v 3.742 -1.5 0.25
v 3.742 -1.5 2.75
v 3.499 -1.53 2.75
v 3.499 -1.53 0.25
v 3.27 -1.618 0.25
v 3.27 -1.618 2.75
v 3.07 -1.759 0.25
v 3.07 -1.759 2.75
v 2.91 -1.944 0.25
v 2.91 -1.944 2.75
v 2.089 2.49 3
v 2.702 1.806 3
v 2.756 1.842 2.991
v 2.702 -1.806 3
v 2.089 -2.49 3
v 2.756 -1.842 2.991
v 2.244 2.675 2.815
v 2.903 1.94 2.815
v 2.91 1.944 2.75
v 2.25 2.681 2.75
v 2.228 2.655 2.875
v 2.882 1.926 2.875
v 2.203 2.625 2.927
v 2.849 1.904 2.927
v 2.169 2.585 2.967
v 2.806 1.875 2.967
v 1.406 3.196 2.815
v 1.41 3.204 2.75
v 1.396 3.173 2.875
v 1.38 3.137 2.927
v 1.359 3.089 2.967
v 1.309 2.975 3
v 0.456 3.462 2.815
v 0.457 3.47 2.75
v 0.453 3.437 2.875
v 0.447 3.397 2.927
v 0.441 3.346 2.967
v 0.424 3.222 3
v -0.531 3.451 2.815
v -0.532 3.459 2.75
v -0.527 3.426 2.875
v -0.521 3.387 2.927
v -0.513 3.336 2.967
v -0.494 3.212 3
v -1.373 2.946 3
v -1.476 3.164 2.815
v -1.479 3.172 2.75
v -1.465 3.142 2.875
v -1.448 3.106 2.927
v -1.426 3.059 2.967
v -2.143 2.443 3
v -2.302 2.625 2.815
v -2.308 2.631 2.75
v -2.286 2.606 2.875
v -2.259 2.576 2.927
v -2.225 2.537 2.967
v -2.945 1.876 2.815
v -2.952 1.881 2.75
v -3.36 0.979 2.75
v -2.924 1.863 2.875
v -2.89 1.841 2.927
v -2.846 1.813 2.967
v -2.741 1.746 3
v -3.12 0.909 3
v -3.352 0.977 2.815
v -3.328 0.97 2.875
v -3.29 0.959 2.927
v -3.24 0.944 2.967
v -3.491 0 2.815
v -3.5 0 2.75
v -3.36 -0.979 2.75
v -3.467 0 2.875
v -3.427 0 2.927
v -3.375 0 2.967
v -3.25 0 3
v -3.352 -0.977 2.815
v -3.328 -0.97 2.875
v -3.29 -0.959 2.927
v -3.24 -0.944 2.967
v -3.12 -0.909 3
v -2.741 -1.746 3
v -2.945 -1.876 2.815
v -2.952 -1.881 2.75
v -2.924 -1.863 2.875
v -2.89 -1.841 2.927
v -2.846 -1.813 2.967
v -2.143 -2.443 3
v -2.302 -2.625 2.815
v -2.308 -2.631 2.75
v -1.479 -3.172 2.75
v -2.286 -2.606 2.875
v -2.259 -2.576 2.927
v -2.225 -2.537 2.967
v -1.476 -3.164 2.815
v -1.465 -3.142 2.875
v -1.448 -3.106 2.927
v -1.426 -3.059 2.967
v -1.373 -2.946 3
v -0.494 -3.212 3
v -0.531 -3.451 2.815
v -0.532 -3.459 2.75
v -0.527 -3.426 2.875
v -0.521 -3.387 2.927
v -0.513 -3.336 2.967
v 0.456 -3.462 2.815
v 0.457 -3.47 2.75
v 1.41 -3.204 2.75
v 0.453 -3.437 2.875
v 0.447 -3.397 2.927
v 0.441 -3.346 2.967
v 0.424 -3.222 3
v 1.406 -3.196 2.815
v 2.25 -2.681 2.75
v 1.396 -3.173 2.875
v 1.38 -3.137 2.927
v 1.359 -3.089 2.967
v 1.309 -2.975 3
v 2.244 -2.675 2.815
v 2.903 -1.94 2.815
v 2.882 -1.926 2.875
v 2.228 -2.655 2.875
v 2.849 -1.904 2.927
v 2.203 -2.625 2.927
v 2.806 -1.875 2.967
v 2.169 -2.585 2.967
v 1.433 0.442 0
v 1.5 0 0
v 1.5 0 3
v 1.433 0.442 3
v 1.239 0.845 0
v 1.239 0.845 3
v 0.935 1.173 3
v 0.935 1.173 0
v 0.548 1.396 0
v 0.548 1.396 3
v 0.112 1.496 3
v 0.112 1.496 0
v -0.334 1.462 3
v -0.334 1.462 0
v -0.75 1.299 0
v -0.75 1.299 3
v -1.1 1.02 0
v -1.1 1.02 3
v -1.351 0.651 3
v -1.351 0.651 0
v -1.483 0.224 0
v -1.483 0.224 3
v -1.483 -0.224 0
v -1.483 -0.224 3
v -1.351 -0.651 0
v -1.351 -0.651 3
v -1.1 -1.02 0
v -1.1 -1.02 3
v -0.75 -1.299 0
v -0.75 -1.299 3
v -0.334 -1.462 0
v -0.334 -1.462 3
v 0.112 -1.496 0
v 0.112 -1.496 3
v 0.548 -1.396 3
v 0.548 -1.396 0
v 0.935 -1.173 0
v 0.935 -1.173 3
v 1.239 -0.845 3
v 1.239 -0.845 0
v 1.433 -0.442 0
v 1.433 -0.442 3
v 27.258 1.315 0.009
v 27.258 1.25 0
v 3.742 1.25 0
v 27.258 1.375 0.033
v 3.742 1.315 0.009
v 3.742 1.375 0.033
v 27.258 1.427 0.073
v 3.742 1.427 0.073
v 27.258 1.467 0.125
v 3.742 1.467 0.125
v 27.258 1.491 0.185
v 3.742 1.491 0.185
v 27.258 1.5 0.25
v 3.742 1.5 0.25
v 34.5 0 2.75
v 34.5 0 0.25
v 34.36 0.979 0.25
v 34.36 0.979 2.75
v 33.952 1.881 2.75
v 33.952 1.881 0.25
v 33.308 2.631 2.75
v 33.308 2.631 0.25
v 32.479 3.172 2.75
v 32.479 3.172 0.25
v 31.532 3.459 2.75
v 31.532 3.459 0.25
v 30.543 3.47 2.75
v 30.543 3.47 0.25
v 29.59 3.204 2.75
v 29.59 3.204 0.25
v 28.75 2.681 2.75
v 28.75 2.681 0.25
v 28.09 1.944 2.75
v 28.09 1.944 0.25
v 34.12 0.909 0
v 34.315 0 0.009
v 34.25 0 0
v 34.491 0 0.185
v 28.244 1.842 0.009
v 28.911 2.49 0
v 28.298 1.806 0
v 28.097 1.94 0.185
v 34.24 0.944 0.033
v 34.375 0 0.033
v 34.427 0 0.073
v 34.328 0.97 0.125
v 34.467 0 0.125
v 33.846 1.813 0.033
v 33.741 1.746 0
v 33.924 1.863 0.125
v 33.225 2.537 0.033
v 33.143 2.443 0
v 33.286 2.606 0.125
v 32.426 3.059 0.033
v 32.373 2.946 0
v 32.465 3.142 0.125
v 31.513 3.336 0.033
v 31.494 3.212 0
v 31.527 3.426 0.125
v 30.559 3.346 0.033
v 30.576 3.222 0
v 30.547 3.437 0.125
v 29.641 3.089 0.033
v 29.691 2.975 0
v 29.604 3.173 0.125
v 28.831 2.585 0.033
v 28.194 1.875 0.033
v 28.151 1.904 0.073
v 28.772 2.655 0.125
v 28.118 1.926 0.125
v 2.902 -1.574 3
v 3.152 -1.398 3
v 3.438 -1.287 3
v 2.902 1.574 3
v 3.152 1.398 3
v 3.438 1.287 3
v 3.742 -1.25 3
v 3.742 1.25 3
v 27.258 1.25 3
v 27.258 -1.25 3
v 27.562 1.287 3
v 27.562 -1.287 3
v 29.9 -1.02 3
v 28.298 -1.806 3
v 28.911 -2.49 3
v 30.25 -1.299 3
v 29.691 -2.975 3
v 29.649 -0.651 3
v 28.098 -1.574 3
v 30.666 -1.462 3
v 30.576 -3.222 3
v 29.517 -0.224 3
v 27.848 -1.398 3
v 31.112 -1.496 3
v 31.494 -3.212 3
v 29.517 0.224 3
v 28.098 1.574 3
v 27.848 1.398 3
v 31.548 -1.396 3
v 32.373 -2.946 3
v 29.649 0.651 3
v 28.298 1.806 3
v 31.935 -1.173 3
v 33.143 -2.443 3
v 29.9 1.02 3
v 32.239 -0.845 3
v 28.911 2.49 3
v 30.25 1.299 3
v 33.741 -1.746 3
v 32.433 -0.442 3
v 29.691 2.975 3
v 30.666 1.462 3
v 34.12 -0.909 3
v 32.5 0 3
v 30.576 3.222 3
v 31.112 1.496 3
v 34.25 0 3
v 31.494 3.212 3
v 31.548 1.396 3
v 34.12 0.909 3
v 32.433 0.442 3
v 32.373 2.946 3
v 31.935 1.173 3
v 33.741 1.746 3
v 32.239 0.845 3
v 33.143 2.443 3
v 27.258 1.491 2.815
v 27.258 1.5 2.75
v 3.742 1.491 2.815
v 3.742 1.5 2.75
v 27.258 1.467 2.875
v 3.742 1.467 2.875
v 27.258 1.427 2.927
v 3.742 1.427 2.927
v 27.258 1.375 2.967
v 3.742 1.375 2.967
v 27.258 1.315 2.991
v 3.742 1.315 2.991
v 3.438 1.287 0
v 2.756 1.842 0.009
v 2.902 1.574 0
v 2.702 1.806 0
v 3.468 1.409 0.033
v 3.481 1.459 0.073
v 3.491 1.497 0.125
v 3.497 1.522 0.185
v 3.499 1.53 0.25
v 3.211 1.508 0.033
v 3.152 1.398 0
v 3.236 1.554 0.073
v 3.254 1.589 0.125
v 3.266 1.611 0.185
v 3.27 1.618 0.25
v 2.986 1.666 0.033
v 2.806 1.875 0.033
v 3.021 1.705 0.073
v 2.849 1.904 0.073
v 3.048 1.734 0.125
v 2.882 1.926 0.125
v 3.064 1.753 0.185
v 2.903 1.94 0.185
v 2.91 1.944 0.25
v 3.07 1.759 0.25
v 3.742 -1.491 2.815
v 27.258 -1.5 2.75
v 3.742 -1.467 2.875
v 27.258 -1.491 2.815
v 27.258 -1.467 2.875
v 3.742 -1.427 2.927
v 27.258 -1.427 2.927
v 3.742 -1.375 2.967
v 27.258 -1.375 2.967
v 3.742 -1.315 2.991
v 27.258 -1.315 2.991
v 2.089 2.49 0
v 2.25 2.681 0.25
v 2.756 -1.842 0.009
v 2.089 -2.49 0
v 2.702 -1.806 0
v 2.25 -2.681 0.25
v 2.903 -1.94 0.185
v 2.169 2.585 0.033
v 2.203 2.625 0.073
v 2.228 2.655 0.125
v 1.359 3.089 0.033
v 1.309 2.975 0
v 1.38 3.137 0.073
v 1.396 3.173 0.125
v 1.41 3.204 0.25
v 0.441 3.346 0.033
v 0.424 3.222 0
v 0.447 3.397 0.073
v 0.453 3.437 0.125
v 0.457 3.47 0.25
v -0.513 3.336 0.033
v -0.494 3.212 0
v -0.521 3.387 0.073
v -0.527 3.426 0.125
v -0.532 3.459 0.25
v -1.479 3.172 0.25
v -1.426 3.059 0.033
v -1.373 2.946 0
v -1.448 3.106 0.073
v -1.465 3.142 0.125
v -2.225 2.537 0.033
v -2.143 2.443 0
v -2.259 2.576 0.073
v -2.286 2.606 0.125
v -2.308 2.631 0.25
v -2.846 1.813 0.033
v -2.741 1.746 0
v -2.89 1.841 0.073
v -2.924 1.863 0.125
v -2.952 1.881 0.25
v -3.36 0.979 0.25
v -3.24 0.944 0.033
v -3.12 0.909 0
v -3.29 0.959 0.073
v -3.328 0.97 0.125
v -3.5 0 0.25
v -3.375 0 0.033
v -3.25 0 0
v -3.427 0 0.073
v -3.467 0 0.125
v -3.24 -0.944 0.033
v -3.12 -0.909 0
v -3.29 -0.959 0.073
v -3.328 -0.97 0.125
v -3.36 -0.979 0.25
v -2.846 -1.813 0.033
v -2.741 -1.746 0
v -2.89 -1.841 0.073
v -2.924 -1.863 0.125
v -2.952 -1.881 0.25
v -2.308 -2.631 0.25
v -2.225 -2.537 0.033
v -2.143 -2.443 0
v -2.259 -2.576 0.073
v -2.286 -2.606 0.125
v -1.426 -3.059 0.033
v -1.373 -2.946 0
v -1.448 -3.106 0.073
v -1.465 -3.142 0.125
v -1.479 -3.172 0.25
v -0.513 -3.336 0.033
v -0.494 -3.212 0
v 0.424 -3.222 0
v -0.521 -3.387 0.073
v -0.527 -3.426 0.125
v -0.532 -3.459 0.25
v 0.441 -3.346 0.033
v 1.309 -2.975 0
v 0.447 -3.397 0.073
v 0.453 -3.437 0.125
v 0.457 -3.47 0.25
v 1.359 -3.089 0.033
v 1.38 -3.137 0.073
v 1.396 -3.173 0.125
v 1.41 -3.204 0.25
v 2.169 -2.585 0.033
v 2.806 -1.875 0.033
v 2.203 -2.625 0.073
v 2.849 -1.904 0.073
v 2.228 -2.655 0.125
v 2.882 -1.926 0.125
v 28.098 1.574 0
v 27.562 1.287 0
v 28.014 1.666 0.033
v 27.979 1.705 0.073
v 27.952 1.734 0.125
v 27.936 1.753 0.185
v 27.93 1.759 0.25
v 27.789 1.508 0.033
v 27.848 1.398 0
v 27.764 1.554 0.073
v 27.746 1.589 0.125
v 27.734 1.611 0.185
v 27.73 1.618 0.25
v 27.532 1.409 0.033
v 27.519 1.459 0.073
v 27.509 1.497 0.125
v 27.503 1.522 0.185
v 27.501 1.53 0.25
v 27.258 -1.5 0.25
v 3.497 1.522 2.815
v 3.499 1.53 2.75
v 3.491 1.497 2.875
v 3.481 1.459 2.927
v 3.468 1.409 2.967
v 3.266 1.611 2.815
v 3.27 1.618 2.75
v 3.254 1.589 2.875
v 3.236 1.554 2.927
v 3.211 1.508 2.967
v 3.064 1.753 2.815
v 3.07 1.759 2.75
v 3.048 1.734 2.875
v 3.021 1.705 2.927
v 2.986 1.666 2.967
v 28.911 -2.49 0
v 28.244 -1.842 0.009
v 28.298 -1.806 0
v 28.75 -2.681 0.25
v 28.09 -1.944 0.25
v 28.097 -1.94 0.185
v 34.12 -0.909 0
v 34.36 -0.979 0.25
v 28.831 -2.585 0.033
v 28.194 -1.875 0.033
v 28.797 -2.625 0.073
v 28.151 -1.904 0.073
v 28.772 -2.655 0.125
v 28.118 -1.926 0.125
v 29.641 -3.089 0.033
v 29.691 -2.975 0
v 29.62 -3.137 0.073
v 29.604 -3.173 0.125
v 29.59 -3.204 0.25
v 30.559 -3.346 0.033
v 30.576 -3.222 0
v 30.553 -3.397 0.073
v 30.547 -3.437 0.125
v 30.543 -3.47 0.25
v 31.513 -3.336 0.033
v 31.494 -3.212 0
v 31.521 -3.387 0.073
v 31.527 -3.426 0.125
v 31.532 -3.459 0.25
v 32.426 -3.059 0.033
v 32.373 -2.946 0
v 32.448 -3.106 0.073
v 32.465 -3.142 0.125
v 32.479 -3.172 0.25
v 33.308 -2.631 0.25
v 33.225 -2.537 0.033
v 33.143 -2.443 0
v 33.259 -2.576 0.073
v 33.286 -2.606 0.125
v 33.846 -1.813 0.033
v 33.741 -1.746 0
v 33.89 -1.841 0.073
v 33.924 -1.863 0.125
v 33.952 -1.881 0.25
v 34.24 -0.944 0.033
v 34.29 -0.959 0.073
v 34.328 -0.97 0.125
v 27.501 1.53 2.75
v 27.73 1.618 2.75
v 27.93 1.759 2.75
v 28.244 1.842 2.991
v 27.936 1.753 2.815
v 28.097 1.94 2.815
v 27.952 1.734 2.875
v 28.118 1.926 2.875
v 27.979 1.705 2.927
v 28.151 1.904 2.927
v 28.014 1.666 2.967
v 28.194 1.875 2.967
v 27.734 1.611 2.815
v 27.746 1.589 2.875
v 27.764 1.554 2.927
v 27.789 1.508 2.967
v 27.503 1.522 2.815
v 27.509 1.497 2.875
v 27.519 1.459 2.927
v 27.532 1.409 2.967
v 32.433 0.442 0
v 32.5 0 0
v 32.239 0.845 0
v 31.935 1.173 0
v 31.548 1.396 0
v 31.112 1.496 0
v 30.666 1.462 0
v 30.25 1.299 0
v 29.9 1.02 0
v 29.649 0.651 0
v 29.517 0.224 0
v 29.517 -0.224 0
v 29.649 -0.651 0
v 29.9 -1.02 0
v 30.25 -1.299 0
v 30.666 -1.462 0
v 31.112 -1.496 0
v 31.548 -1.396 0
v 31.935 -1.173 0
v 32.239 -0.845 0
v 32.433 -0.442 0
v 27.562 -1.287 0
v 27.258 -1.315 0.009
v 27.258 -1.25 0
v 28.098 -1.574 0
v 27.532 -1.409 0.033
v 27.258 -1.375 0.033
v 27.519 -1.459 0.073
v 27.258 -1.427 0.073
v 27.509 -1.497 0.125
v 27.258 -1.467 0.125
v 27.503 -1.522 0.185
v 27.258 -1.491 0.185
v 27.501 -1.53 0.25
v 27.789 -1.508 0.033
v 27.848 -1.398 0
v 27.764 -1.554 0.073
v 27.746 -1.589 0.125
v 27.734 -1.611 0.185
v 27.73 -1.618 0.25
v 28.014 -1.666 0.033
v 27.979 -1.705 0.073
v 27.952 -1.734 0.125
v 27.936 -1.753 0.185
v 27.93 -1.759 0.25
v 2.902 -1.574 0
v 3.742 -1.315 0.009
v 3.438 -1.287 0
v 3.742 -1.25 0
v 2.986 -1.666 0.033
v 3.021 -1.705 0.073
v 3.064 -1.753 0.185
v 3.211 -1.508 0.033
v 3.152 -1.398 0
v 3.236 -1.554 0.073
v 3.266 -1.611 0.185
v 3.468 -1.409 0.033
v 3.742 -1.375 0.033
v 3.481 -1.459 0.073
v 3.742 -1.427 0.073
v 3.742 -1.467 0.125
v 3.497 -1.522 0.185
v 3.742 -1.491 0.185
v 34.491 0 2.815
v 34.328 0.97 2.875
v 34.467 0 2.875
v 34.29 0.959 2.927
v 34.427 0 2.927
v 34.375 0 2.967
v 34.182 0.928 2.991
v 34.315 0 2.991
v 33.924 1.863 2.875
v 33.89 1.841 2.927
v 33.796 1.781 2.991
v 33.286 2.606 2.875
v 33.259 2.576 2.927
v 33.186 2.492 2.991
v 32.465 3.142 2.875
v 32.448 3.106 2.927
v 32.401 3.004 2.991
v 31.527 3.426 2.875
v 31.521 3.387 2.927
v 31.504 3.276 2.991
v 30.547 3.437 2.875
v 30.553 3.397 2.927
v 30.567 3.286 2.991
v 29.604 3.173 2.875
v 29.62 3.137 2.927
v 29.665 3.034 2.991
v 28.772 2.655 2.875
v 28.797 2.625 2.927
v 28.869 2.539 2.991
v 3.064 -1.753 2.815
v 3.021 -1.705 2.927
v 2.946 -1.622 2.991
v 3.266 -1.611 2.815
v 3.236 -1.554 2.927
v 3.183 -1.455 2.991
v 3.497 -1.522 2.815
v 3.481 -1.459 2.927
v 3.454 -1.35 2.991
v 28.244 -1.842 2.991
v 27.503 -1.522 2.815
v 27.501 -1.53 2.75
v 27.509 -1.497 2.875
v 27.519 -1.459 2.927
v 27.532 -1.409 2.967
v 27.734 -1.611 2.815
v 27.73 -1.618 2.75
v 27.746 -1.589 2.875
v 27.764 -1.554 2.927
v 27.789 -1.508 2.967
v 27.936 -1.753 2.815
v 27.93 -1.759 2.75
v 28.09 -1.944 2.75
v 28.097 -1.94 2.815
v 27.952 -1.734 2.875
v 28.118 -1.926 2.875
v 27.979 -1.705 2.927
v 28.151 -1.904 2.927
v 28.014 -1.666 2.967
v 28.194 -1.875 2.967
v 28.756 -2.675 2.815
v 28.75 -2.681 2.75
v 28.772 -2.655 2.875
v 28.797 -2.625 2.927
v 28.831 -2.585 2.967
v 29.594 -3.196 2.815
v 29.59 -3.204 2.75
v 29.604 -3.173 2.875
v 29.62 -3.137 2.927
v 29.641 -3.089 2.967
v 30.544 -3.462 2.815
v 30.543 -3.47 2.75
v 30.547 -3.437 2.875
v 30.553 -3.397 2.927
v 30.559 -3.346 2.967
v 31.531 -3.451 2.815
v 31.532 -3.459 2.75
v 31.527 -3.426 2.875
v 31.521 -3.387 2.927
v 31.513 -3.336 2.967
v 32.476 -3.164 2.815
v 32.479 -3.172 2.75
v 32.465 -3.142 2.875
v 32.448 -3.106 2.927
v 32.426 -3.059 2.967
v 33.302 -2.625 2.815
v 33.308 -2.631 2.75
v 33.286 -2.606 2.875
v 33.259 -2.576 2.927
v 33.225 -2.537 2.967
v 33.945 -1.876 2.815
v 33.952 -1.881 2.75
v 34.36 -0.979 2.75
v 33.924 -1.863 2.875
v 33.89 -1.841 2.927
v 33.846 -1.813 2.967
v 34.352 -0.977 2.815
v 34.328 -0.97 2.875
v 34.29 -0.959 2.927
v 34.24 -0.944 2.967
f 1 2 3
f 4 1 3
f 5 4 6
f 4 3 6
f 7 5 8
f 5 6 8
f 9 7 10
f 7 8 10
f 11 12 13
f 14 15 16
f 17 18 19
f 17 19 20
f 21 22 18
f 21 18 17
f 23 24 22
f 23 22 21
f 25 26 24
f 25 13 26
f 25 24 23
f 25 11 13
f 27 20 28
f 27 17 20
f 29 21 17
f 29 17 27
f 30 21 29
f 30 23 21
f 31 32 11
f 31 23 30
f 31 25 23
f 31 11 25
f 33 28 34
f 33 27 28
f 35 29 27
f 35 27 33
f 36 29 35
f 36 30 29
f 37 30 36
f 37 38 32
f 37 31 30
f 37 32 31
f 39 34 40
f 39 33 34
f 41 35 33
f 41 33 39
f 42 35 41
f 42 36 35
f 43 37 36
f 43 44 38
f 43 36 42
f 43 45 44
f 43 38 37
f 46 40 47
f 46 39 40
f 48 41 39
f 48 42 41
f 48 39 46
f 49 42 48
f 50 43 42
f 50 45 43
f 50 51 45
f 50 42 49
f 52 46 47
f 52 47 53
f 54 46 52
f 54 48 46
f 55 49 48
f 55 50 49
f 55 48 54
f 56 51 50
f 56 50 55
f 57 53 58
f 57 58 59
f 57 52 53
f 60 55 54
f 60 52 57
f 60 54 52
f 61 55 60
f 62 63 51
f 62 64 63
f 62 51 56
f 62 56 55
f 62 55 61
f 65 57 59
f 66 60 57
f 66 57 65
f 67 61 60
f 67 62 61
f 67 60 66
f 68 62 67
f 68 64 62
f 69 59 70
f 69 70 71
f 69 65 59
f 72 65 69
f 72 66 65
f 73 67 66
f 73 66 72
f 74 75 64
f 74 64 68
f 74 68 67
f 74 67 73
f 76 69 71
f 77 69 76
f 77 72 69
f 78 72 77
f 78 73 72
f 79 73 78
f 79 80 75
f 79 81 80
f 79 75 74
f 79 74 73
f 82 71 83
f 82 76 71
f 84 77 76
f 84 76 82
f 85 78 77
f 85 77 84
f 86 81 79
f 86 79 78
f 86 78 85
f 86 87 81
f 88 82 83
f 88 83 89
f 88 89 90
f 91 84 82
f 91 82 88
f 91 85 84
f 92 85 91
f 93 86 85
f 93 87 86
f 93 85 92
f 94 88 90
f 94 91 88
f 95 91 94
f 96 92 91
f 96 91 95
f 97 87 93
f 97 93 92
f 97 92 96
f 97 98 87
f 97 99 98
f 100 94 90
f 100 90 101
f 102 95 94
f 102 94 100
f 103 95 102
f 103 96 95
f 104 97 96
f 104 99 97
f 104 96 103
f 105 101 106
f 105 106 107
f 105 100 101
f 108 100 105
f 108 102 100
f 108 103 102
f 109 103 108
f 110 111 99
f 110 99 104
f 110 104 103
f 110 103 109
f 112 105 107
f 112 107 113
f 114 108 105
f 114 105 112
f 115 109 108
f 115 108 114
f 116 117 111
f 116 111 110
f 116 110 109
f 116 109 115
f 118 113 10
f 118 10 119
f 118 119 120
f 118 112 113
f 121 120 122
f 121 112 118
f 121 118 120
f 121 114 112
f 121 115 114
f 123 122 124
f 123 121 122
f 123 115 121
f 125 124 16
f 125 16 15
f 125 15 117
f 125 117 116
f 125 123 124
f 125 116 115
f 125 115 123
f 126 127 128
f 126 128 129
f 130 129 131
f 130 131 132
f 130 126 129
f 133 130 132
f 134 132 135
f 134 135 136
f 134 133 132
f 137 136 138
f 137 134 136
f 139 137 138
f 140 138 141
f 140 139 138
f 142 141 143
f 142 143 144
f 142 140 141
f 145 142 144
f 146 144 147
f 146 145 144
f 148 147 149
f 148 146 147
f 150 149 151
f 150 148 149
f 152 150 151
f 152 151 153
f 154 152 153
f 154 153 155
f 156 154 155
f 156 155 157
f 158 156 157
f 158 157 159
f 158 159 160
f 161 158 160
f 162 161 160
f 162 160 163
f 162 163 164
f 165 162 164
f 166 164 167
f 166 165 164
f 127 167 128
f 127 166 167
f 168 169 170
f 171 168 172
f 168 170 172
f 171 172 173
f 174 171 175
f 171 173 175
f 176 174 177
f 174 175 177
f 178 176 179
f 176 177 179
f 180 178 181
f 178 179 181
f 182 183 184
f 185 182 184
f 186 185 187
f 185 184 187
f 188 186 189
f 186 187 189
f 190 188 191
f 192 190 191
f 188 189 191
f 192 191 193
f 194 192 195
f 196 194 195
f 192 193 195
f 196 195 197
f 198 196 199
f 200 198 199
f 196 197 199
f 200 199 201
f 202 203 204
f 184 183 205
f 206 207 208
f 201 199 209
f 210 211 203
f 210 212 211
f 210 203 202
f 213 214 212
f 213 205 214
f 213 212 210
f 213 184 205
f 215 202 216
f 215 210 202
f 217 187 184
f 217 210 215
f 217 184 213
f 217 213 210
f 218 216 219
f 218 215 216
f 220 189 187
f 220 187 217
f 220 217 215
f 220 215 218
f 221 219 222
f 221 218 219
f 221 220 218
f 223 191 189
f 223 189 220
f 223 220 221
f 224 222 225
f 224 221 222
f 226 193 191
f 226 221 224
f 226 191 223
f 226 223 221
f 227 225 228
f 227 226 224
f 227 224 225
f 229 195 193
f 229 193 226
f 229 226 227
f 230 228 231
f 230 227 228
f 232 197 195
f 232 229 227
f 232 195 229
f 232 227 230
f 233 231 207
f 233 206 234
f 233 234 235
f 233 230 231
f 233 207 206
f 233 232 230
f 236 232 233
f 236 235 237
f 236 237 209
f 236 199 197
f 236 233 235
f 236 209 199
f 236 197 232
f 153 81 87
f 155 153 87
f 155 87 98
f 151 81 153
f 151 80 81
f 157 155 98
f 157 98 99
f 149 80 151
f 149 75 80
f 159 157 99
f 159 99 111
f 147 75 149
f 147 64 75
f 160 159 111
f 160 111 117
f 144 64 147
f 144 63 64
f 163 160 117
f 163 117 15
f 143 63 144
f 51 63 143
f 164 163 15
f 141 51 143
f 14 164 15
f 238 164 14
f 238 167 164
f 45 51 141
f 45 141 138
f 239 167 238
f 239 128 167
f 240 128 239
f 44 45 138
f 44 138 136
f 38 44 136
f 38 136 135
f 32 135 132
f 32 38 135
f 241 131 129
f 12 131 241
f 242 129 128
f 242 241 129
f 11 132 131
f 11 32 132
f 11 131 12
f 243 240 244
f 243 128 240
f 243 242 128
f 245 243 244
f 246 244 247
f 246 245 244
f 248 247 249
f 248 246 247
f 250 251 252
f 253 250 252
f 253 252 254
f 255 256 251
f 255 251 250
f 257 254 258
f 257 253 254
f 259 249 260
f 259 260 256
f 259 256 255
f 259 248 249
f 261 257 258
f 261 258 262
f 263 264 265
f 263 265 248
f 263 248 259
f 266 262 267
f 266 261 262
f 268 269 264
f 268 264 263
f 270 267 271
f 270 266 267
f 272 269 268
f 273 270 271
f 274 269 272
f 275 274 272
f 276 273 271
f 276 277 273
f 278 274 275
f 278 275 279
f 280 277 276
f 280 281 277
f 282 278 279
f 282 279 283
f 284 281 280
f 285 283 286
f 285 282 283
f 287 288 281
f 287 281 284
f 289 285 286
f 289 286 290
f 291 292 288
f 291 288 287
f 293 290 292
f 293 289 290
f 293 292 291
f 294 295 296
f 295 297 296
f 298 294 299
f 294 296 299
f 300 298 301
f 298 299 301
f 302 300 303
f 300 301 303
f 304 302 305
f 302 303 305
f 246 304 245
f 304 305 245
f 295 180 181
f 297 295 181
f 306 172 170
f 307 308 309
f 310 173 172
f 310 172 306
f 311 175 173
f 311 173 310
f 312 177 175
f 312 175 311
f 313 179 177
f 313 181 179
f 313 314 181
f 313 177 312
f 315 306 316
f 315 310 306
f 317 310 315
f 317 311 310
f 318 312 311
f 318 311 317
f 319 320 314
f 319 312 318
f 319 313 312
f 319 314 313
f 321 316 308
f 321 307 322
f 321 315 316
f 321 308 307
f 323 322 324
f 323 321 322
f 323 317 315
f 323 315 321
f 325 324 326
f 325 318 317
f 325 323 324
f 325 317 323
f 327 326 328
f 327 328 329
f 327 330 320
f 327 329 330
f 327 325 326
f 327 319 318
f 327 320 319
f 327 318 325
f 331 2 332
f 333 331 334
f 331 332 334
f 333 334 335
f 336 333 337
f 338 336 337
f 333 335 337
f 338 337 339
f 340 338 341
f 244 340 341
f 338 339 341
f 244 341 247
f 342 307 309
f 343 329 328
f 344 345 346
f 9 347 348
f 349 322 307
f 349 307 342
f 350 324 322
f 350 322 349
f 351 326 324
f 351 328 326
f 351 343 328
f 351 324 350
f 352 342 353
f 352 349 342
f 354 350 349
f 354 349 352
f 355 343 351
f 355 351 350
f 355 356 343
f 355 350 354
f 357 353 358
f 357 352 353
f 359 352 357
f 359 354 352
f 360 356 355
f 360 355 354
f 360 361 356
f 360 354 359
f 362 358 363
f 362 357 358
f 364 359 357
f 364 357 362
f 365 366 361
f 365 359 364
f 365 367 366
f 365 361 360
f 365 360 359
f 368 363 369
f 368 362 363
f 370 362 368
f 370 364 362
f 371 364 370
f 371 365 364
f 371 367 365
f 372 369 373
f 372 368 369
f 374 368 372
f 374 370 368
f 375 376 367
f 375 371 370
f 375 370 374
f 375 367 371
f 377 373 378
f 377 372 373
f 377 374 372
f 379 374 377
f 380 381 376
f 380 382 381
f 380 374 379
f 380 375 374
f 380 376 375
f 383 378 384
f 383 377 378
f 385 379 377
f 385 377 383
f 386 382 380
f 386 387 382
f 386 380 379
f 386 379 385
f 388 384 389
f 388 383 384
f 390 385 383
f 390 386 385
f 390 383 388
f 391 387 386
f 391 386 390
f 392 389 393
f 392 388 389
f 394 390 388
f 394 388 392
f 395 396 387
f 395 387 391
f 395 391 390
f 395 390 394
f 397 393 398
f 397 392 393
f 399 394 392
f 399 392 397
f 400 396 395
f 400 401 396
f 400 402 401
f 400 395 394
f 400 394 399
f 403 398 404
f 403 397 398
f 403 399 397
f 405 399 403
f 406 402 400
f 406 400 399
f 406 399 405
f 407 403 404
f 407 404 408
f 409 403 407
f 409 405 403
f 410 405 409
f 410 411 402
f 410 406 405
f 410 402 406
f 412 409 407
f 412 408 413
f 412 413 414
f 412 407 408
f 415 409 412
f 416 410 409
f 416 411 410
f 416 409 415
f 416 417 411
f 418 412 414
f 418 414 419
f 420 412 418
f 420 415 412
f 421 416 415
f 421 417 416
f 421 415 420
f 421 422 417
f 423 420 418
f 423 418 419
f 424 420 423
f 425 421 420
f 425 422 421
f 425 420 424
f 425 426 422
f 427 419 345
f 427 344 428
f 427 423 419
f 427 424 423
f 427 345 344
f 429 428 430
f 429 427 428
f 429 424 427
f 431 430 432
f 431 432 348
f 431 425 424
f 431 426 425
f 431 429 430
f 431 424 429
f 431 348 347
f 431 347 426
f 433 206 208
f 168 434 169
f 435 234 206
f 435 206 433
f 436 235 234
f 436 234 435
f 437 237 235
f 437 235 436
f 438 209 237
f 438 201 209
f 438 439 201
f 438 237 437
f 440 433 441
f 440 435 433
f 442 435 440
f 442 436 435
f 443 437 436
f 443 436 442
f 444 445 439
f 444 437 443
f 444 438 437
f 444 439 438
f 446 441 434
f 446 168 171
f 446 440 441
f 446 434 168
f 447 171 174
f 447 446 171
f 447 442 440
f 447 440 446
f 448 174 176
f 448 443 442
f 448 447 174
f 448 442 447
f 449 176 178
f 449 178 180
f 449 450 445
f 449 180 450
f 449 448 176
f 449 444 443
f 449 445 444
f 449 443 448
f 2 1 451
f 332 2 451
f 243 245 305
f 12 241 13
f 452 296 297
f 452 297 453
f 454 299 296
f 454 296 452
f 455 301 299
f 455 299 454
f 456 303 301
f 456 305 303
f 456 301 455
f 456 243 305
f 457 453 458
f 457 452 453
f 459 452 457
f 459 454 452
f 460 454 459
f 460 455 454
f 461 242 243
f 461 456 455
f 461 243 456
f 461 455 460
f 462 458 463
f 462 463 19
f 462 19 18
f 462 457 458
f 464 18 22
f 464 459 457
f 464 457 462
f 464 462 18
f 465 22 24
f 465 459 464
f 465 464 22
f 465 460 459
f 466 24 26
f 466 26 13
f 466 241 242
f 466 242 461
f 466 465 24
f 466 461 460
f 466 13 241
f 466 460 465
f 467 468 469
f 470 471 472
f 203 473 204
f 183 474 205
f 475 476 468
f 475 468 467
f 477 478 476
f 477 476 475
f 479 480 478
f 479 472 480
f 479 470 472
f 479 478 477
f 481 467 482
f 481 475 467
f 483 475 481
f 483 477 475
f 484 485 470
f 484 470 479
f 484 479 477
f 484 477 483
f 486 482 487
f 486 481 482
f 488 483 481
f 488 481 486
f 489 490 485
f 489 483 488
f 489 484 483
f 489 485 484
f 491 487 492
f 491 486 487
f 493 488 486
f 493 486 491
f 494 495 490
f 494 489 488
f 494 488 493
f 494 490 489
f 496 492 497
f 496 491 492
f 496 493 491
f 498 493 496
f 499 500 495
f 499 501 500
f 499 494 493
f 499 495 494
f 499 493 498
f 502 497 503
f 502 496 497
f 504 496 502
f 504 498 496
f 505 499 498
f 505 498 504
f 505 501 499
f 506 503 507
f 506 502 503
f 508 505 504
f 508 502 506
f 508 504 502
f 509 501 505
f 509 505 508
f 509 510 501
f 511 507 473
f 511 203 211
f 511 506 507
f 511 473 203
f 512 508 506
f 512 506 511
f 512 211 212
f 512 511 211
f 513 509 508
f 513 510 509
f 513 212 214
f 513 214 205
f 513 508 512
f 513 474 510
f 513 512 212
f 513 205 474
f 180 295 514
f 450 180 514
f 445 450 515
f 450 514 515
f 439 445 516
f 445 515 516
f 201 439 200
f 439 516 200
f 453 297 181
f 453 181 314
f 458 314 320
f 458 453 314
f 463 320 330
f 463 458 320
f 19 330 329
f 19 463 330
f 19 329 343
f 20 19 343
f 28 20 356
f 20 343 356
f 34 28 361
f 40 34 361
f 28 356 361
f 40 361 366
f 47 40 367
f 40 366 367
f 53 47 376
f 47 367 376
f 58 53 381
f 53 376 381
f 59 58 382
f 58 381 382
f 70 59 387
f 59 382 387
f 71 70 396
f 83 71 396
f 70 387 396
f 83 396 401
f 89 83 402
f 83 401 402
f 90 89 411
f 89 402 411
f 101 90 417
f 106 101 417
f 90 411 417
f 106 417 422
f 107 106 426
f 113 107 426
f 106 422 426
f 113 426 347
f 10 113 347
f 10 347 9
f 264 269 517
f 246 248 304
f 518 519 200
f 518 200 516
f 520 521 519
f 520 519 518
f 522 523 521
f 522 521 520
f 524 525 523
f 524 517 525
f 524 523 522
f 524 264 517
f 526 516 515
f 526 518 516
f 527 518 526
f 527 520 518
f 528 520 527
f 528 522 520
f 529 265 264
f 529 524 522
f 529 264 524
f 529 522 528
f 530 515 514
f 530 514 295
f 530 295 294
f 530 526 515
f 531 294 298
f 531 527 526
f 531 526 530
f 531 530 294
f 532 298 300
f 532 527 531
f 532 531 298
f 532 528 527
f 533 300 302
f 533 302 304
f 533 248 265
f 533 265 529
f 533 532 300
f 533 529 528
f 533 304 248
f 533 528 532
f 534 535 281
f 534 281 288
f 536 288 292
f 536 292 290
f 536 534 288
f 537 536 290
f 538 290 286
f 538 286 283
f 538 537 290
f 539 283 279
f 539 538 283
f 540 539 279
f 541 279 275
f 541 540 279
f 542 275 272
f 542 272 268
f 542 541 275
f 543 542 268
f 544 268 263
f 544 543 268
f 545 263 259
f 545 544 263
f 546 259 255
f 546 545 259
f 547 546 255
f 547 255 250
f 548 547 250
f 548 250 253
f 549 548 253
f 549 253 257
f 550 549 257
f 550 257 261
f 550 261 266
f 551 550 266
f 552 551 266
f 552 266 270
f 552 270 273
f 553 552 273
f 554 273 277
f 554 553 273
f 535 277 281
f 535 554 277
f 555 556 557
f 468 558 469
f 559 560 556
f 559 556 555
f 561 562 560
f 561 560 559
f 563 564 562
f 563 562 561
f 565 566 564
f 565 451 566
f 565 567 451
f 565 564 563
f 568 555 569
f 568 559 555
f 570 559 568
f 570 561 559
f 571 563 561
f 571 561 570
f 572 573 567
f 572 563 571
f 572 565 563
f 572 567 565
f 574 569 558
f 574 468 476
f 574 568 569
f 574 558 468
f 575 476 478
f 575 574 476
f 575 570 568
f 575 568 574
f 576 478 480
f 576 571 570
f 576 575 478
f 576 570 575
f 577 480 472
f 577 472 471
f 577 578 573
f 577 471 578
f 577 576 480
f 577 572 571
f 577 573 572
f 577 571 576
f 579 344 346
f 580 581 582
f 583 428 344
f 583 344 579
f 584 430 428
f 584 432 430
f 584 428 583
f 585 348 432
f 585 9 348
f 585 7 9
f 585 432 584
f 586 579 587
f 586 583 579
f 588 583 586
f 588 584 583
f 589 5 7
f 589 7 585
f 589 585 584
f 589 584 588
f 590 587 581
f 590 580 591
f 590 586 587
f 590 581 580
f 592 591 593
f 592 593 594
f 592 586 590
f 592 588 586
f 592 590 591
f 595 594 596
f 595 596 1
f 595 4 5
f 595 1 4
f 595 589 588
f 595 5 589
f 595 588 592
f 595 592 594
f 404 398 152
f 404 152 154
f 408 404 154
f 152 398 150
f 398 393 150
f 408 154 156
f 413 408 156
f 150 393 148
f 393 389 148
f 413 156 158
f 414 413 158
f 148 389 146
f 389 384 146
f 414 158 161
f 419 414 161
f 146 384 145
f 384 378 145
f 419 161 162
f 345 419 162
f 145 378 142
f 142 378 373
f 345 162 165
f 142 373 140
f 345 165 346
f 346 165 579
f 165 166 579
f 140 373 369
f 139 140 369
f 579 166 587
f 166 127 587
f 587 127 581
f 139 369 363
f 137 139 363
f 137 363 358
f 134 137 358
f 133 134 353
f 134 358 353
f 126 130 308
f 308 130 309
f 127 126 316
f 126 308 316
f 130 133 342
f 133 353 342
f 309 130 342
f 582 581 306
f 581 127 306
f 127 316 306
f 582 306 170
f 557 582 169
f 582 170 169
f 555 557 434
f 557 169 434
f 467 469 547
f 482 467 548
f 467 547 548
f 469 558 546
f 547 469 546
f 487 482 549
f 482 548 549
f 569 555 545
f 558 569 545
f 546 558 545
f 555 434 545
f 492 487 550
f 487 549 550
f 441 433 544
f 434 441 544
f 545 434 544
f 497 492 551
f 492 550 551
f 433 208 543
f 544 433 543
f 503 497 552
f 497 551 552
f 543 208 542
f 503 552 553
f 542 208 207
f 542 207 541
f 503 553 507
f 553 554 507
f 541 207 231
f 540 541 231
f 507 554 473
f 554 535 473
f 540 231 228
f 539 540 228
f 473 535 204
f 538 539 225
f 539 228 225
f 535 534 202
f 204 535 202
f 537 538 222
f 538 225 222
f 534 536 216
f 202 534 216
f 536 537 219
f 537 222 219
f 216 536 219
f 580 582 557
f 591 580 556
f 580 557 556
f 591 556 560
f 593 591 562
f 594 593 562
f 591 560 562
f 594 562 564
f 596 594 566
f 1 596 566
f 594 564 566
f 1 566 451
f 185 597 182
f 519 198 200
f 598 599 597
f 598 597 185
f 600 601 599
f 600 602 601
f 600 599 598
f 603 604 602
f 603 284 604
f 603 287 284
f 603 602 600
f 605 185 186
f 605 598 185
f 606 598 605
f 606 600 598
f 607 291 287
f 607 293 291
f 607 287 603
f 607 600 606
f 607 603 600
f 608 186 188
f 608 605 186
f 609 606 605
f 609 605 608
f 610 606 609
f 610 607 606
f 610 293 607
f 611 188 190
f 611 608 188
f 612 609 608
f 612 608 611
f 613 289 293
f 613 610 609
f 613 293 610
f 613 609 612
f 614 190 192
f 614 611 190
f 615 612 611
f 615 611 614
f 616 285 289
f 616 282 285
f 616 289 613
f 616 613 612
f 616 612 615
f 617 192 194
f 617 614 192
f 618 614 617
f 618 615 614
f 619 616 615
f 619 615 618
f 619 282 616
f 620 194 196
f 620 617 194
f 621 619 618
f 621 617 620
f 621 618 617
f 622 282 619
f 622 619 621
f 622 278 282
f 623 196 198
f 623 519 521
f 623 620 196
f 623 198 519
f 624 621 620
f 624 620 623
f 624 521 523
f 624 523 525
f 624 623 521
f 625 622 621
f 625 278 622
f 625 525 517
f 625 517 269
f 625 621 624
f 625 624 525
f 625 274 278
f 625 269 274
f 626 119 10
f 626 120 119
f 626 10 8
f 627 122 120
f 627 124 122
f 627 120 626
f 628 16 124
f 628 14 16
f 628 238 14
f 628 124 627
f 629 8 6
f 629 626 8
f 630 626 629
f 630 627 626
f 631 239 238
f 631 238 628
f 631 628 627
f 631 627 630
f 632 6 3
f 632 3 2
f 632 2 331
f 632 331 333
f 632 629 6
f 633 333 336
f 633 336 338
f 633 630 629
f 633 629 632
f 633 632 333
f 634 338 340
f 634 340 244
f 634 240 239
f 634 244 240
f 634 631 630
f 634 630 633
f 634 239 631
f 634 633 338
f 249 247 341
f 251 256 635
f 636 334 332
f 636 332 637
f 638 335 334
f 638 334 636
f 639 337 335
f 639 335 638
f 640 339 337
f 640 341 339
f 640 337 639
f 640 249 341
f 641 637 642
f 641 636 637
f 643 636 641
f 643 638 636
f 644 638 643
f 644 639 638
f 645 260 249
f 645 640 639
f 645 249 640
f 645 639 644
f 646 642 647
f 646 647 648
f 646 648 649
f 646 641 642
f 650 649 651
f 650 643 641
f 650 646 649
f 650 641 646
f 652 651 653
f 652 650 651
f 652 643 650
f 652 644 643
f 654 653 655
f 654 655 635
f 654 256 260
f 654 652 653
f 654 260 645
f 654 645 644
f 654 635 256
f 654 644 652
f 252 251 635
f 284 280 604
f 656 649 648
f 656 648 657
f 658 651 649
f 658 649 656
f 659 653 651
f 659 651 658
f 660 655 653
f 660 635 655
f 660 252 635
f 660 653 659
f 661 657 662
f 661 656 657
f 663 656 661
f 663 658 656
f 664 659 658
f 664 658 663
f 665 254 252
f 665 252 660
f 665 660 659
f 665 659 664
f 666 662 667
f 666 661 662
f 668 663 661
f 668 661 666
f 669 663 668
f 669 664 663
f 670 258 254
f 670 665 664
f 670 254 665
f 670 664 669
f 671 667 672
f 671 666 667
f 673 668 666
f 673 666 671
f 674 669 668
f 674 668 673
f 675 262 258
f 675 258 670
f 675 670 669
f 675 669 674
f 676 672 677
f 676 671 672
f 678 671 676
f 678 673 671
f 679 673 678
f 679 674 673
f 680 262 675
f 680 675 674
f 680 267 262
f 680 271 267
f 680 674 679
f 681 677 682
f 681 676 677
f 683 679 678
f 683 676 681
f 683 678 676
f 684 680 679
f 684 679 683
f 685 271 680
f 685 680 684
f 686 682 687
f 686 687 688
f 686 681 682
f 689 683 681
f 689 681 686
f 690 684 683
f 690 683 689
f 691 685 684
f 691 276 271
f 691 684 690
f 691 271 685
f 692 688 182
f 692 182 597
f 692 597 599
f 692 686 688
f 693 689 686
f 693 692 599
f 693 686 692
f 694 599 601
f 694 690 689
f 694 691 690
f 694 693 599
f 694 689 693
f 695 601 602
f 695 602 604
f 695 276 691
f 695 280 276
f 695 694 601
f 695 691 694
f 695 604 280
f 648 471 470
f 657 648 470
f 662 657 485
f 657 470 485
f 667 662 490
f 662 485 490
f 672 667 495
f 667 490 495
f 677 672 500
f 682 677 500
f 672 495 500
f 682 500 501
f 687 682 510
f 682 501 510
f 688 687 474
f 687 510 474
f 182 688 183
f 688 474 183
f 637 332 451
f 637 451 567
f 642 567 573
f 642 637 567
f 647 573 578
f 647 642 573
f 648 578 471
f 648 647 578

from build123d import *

# Parameters (mm, degrees)
SKETCH3_R           = 1.5
BOSS_EXTRUDE2_DEPTH = 3
FILLET1_R           = 1
FILLET2_R           = 0.25


with BuildPart() as part:
    # Sketch3 → Boss-Extrude2 (new body)
    # profile 1 of 5: a face of its own
    with BuildSketch(Plane.XY):
        with BuildLine():
            ThreePointArc((3.16227766, 1.5), (-3.5, 0), (3.16227766, -1.5))
            Line((3.16227766, -1.5), (3.16227766, 1.5))
        make_face()
        Circle(SKETCH3_R, mode=Mode.SUBTRACT)
    # profile 2 of 5: a face of its own
    with BuildSketch(Plane.XY):
        with BuildLine():
            Line((3.16227766, 1.5), (3.16227766, -1.5))
            ThreePointArc((3.16227766, -1.5), (3.414525722, -0.768774411), (3.5, 0))
            ThreePointArc((3.5, 0), (3.414525722, 0.768774411), (3.16227766, 1.5))
        make_face()
    # profile 3 of 5: a face of its own
    with BuildSketch(Plane.XY):
        with BuildLine():
            Line((3.16227766, -1.5), (27.83772234, -1.5))
            ThreePointArc((27.83772234, -1.5), (27.5, 0), (27.83772234, 1.5))
            Line((27.83772234, 1.5), (3.16227766, 1.5))
            ThreePointArc((3.16227766, 1.5), (3.414525722, 0.768774411), (3.5, 0))
            ThreePointArc((3.5, 0), (3.414525722, -0.768774411), (3.16227766, -1.5))
        make_face()
    # profile 4 of 5: a face of its own
    with BuildSketch(Plane.XY):
        with BuildLine():
            Line((27.83772234, 1.5), (27.83772234, -1.5))
            ThreePointArc((27.83772234, -1.5), (31.768774411, -3.414525722), (34.5, 0))
            ThreePointArc((34.5, 0), (31.768774411, 3.414525722), (27.83772234, 1.5))
        make_face()
        with Locations((31, 0)):
            Circle(SKETCH3_R, mode=Mode.SUBTRACT)
    # profile 5 of 5: a face of its own
    with BuildSketch(Plane.XY):
        with BuildLine():
            ThreePointArc((27.83772234, 1.5), (27.5, 0), (27.83772234, -1.5))
            Line((27.83772234, -1.5), (27.83772234, 1.5))
        make_face()
    extrude(amount=BOSS_EXTRUDE2_DEPTH)

    # Fillet1
    fillet1_edges = [part.edges().sort_by_distance(p)[0] for p in [
        (3.16227766, 1.5, 1.5),
        (27.83772234, 1.5, 1.5),
        (27.83772234, -1.5, 1.5),
        (3.16227766, -1.5, 1.5),
    ]]
    fillet(fillet1_edges, radius=FILLET1_R)

    # Fillet2
    fillet2_edges = [part.edges().sort_by_distance(p)[0] for p in [
        (15.5, -1.5, 0),
        (15.5, -1.5, 3),
        (-3.5, 0, 0),
        (-3.5, 0, 3),
        (15.5, 1.5, 0),
        (15.5, 1.5, 3),
        (34.5, 0, 0),
        (34.5, 0, 3),
        (3.270252866, -1.618082896, 0),
        (3.270252866, -1.618082896, 3),
        (3.270252866, 1.618082896, 0),
        (3.270252866, 1.618082896, 3),
        (27.729747134, 1.618082896, 0),
        (27.729747134, 1.618082896, 3),
        (27.729747134, -1.618082896, 0),
        (27.729747134, -1.618082896, 3),
    ]]
    fillet(fillet2_edges, radius=FILLET2_R)


solid = part.part
